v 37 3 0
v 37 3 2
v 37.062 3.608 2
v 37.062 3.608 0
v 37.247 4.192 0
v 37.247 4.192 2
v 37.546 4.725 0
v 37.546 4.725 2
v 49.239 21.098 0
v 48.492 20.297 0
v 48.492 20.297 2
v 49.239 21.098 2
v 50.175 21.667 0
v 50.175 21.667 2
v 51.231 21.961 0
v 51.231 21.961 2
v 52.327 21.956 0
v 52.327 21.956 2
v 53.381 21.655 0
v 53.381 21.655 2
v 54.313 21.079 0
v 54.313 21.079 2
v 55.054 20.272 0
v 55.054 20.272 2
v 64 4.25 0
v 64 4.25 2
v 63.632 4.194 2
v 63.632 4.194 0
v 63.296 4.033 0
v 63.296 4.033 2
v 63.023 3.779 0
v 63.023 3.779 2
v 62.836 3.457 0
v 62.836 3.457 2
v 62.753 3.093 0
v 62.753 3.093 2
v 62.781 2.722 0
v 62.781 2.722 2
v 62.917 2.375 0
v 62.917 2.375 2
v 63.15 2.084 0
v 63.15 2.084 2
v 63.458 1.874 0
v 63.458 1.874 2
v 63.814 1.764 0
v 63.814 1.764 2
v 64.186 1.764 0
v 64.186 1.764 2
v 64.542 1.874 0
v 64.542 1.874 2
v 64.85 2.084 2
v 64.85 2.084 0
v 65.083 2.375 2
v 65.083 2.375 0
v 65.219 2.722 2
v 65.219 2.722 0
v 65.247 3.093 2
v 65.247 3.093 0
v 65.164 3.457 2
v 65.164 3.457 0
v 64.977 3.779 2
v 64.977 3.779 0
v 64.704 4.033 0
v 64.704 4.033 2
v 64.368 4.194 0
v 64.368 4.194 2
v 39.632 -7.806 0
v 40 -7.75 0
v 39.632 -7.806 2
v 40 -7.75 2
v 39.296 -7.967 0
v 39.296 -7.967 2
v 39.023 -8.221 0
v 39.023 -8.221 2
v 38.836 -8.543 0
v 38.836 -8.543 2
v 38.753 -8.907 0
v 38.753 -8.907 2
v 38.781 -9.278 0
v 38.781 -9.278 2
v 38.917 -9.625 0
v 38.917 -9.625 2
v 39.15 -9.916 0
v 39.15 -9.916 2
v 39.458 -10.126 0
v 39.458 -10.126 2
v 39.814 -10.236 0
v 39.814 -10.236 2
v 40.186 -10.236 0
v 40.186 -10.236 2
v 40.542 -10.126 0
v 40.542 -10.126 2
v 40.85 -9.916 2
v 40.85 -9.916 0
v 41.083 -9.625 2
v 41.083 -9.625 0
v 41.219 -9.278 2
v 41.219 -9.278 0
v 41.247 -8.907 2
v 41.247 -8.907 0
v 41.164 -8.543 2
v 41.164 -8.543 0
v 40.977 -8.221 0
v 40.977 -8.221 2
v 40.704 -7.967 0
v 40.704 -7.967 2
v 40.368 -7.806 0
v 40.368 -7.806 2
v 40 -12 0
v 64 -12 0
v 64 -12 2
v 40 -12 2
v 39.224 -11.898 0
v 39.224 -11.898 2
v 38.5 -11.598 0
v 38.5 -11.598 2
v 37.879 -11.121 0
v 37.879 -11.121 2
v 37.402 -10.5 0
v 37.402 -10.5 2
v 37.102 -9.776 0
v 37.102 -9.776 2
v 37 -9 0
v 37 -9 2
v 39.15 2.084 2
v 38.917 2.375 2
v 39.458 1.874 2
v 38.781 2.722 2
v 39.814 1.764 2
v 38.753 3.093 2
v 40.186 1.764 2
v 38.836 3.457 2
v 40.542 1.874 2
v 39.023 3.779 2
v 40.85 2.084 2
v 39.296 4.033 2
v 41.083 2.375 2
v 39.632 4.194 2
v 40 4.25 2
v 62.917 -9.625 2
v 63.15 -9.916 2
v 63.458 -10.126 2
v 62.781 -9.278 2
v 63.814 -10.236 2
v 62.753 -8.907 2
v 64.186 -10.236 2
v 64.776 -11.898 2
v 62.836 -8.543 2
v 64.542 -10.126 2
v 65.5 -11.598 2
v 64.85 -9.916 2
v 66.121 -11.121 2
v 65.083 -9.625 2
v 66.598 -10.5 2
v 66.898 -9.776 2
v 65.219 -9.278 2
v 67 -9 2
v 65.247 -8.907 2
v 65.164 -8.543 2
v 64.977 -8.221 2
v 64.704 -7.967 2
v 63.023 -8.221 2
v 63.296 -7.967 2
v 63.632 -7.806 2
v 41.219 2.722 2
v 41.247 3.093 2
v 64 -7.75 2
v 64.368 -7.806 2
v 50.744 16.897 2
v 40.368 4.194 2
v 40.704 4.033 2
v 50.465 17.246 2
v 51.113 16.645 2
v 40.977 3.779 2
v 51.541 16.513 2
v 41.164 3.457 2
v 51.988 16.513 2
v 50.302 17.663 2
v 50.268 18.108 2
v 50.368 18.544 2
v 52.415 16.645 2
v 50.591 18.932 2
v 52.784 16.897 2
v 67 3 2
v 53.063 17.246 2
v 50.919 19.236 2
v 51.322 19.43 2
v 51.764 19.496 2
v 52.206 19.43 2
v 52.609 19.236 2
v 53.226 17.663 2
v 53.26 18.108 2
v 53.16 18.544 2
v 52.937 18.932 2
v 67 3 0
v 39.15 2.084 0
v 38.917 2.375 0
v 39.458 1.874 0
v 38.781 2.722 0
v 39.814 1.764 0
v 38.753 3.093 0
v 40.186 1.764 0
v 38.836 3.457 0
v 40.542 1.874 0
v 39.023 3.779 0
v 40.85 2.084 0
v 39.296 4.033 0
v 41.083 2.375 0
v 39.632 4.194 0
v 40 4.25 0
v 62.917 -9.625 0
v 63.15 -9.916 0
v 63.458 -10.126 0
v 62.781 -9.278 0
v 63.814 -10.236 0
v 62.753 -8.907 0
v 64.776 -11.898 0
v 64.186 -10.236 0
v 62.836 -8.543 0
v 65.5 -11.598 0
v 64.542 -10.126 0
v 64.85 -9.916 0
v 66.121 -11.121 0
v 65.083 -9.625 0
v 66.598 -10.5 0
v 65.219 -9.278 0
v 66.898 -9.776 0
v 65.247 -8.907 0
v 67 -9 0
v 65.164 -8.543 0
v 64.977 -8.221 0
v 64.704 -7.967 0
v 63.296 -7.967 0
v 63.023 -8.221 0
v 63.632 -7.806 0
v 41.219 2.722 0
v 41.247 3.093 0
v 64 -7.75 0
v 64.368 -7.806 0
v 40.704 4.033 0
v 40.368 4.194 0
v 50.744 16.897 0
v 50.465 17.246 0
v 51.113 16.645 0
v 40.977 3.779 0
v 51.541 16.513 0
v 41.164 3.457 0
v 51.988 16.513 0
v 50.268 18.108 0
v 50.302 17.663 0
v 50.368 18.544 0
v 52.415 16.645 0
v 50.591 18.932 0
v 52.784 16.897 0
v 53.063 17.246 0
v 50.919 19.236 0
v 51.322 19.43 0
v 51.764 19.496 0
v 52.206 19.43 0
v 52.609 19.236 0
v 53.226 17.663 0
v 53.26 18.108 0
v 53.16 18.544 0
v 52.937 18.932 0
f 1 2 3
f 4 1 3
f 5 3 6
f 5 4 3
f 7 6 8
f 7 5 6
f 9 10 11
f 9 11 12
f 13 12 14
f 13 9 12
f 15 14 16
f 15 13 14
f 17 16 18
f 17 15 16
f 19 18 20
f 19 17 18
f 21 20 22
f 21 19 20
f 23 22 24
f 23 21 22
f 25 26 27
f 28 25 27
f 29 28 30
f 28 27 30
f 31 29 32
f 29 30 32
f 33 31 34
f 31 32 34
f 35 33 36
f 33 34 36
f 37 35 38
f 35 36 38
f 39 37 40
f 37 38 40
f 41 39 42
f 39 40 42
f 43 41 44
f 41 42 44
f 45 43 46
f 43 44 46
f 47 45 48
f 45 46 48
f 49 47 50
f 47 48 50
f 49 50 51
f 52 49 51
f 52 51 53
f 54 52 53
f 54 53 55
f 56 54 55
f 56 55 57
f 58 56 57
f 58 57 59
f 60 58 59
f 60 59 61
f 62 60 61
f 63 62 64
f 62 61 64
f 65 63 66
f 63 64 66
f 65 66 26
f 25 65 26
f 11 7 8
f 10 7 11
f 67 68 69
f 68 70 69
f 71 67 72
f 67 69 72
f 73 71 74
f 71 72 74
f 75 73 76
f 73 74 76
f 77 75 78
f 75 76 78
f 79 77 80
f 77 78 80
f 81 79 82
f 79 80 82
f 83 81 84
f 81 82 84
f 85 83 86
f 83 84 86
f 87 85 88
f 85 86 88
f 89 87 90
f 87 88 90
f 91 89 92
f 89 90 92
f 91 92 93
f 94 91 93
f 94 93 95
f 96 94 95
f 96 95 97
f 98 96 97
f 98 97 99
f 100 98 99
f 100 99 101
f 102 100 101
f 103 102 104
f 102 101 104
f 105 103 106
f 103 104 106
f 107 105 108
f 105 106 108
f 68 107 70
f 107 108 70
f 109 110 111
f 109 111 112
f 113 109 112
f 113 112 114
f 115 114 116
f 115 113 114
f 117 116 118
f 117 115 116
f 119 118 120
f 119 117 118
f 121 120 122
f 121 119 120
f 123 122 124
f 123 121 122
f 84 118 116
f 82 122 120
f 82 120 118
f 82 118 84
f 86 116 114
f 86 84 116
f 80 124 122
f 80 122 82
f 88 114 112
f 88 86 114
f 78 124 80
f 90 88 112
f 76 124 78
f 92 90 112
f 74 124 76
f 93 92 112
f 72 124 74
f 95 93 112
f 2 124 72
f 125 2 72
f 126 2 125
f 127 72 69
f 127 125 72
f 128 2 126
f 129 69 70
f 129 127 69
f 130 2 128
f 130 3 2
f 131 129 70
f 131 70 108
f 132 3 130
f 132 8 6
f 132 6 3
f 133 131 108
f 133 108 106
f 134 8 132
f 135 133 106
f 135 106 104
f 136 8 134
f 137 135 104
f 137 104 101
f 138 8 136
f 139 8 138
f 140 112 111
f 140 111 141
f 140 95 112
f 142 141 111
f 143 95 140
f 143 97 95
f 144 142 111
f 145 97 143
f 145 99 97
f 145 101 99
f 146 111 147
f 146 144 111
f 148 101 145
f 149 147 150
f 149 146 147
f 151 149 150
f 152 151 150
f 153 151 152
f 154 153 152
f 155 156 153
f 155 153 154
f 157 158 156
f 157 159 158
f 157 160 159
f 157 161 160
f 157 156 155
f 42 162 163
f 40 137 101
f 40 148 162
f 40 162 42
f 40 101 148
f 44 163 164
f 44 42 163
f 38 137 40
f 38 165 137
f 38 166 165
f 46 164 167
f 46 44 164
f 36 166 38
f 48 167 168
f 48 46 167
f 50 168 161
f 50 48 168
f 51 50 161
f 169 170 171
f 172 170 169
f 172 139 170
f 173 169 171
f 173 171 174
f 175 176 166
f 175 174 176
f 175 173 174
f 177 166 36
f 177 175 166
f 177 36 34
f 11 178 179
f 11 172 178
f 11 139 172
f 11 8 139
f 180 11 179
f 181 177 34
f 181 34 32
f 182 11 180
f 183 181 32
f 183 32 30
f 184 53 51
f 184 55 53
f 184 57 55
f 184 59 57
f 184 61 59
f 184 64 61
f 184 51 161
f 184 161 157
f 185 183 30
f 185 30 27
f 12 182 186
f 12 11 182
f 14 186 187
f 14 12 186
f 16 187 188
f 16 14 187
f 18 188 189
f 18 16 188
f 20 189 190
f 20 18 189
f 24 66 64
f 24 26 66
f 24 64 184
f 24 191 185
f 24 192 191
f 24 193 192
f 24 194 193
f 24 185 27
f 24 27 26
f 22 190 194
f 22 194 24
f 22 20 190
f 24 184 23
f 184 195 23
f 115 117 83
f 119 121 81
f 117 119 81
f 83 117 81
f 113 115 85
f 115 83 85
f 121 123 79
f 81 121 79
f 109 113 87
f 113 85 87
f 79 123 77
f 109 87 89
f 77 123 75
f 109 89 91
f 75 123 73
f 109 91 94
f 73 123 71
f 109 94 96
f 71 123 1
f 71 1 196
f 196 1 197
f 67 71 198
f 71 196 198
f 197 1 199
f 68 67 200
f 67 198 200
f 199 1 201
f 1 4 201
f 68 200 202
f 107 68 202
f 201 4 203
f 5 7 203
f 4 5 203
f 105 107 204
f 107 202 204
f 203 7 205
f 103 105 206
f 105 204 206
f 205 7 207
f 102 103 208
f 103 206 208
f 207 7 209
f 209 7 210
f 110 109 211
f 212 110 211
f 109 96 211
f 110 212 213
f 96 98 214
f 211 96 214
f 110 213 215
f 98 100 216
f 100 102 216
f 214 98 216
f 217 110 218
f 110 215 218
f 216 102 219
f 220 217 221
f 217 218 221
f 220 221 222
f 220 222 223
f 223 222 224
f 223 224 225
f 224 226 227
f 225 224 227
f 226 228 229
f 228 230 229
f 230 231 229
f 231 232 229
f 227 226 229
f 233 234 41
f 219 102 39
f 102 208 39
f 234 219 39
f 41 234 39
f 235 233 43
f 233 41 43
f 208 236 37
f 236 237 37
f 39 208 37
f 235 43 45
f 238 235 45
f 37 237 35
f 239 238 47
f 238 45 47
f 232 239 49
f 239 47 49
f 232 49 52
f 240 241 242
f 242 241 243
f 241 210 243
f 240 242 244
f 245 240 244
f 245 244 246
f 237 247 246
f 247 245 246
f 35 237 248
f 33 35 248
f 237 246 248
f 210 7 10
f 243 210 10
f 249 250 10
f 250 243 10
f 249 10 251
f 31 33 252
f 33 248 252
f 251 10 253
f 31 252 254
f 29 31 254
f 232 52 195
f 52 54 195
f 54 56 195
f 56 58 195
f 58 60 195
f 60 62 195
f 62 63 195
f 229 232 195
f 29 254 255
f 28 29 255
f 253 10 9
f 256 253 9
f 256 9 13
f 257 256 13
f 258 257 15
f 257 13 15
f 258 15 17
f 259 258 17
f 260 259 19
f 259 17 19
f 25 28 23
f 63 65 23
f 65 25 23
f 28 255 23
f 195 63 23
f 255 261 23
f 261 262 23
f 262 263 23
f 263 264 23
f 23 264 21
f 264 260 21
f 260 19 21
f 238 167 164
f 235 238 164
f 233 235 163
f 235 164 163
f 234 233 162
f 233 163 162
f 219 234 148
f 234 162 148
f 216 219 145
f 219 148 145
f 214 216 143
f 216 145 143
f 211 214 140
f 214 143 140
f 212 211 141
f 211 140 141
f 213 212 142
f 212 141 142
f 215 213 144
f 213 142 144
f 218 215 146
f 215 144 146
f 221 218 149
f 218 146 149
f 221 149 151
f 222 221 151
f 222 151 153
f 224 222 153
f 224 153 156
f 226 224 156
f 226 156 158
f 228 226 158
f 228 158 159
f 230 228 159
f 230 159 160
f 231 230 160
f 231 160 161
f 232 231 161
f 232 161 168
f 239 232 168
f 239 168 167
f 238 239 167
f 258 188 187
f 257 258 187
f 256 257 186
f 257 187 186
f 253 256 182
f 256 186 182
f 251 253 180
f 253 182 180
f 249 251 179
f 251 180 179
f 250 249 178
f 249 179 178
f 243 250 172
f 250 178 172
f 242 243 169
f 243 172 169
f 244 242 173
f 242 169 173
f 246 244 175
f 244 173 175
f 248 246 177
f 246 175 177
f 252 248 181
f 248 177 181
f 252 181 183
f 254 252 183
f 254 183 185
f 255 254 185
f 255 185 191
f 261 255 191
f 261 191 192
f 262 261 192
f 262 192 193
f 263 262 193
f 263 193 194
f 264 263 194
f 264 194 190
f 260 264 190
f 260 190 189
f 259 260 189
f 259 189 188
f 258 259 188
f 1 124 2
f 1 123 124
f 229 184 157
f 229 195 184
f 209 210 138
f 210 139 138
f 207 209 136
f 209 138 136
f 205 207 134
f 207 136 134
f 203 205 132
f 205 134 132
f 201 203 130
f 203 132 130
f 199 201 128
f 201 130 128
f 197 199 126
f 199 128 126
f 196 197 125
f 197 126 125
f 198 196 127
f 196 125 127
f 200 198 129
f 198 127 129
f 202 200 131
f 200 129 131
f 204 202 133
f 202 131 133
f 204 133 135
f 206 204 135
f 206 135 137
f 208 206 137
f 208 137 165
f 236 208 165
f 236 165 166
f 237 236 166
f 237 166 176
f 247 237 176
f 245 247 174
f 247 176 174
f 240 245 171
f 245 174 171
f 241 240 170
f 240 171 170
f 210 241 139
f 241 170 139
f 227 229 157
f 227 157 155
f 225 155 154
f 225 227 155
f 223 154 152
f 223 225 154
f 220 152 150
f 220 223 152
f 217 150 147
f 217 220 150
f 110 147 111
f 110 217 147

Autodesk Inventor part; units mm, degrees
ref_plane "YZ Plane" through (0, 0, 0) normal (1, 0, 0) x (0, 1, 0)
ref_plane "XZ Plane" through (0, 0, 0) normal (0, 1, 0) x (-1, 0, 0)
ref_plane "XY Plane" through (0, 0, 0) normal (0, 0, 1) x (1, 0, 0)
sketch "スケッチ1" plane through (0, 0, 0) normal (0, 0, 1) x (1, 0, 0)
  line L0 (51.397, 0) -> (6, 70) construction
  line L1 (51.397, 0) -> (65, -20.9752)
  line L2 (65, -20.9752) -> (25, -44.6993)
  line L3 (0, 0) -> (0, 56.1205) construction
  line L4 (0, 0) -> (51.397, 0) construction
  arc A0 (17.9848, 26.067) -> (17.1698, 21.0636) centre (51.7641, 17.9963) ccw construction
  arc A1 (10.2038, 27.926) -> (9.201, 21.7701) centre (51.7641, 17.9963) ccw construction
  arc A2 (9.201, 21.7701) -> (17.1698, 21.0636) centre (13.1854, 21.4169) ccw construction
  line L5 (13.1854, 21.4169) -> (51.7641, 17.9963) construction
  line L6 (51.7641, 17.9963) -> (13.5604, 24.3596)
  arc A3 (13.5604, 24.3596) -> (13.1854, 21.4169) centre (51.7641, 17.9963) ccw construction
  line L7 (13.1854, 21.4169) -> (66.7927, -23.5971) construction
  line L8 (66.7927, -23.5971) -> (61.9625, 22.6577) construction
  line L9 (13.5604, 24.3596) -> (25, -44.6993)
  line L10 (13.5604, 24.3596) -> (6, 70) construction
  line L11 (13.5604, 24.3596) -> (51.397, 0) construction
  arc A4 (51.397, -25) -> (61.9625, 22.6577) centre (51.397, 0) ccw
  line L12 (25, -44.6993) -> (65, -44.6993) construction
  line L13 (65, -44.6993) -> (65, -20.9752) construction
  line L14 (45, -44.6993) -> (45, -284.6993) construction
  line L15 (51.397, 0) -> (51.9579, -2.4363)
  line L16 (51.397, 0) -> (50.5419, -2.3492) construction
  arc A5 (50.5419, -2.3492) -> (53.1648, 1.7678) centre (51.397, 0) ccw construction
  line L17 (51.397, 0) -> (51.3697, -2.4999) construction
  line L18 (51.397, 0) -> (52.2006, -2.3673) construction
  line L19 (51.397, 0) -> (52.9404, -1.9667) construction
  line L20 (51.397, 0) -> (53.5055, -1.3432) construction
  line L21 (51.397, 0) -> (53.8317, -0.5677) construction
  line L22 (51.397, 0) -> (53.8821, 0.2722) construction
  line L23 (51.397, 0) -> (53.6511, 1.0812) construction
  line L24 (51.397, 0) -> (53.1648, 1.7678) construction
  line L25 (51.7641, 17.9963) -> (51.9579, -2.4363)
  line L26 (50.5419, -2.3492) -> (51.7641, 17.9963) construction
  line L27 (51.7641, 17.9963) -> (53.1648, 1.7678) construction
  line L28 (51.397, -8) -> (51.397, -25) construction
  line L29 (54.051, -7.5469) -> (59.6907, -23.5842) construction
  line L30 (56.4044, -6.2391) -> (67.0451, -19.4971) construction
  line L31 (58.1906, -4.2245) -> (72.6271, -13.2017) construction
  line L32 (59.2074, -1.7315) -> (75.8044, -5.411) construction
  line L33 (59.3395, 0.9576) -> (76.2172, 2.9926) construction
  line L34 (58.572, 3.5383) -> (73.8188, 11.0572) construction
  line L35 (56.9918, 5.7182) -> (68.8808, 17.8694) construction
  line L36 (54.7779, 7.2505) -> (61.9625, 22.6577) construction
  arc A6 (51.397, -8) -> (54.7779, 7.2505) centre (51.397, 0) ccw construction
  line L37 (14.0943, 26.9965) -> (51.7641, 17.9963) construction
  arc A7 (14.0943, 26.9965) -> (13.5604, 24.3596) centre (51.7641, 17.9963) ccw construction
  arc A8 (17.9848, 26.067) -> (10.2038, 27.926) centre (14.0943, 26.9965) ccw construction
  line L38 (51.3697, -2.4999) -> (51.7641, 17.9963) construction
  line L39 (51.7641, 17.9963) -> (13.7589, 25.4541) construction
  line L40 (13.4871, 23.9026) -> (51.7641, 17.9963) construction
  line L41 (52.2006, -2.3673) -> (51.7641, 17.9963) construction
  line L42 (14.0943, 26.9965) -> (8.4208, -42.7732) construction
  line L43 (8.4208, -42.7732) -> (51.397, -25) construction
  line L44 (13.7589, 25.4541) -> (18.1084, -44.4107) construction
  line L45 (18.1084, -44.4107) -> (59.6907, -23.5842) construction
  line L46 (25, -44.6993) -> (45, -284.6993)
  line L47 (65, -20.9752) -> (45, -284.6993)
  line L48 (18.1084, -44.4107) -> (21.0305, -285.2248) construction
  line L49 (21.0305, -285.2248) -> (59.6907, -23.5842) construction
  line L50 (51.397, -25) -> (-6.0328, -283.171) construction
  line L51 (-6.0328, -283.171) -> (8.4208, -42.7732) construction
  line L52 (51.7641, 17.9963) -> (13.2929, 22.4663) construction
  line L53 (51.7641, 17.9963) -> (13.173, 21.2739) construction
  line L54 (51.7641, 17.9963) -> (13.1124, 20.4583) construction
  line L55 (51.7641, 17.9963) -> (13.0939, 20.1483) construction
  line L56 (51.7641, 17.9963) -> (13.1119, 20.4513) construction
  line L57 (51.7641, 17.9963) -> (52.9404, -1.9667) construction
  line L58 (51.7641, 17.9963) -> (53.5055, -1.3432) construction
  line L59 (51.7641, 17.9963) -> (53.8317, -0.5677) construction
  line L60 (51.7641, 17.9963) -> (53.8821, 0.2722) construction
  line L61 (51.7641, 17.9963) -> (53.6511, 1.0812) construction
  line L62 (13.4871, 23.9026) -> (27.8947, -44.5986) construction
  line L63 (27.8947, -44.5986) -> (67.0451, -19.4971) construction
  line L64 (72.6271, -13.2017) -> (37.1961, -43.3261) construction
  line L65 (37.1961, -43.3261) -> (13.2929, 22.4663) construction
  line L66 (13.173, 21.2739) -> (45.5916, -40.7666) construction
  line L67 (45.5916, -40.7666) -> (75.8044, -5.411) construction
  line L68 (76.2172, 2.9926) -> (52.8124, -37.1951) construction
  line L69 (52.8124, -37.1951) -> (13.1124, 20.4583) construction
  line L70 (13.0939, 20.1483) -> (58.7276, -32.9324) construction
  line L71 (58.7276, -32.9324) -> (73.8188, 11.0572) construction
  line L72 (68.8808, 17.8694) -> (63.3391, -28.3055) construction
  line L73 (63.3391, -28.3055) -> (13.1119, 20.4513) construction
  line L74 (27.8947, -44.5986) -> (56.2327, -283.7575) construction
  line L75 (61.9625, 22.6577) -> (293.1766, -105.7574) construction
  line L76 (293.1766, -105.7574) -> (66.7927, -23.5971) construction
  line L77 (68.8808, 17.8694) -> (265.8829, -158.5975) construction
  line L78 (265.8829, -158.5975) -> (63.3391, -28.3055) construction
  line L79 (58.7276, -32.9324) -> (229.4847, -202.7618) construction
  line L80 (229.4847, -202.7618) -> (73.8188, 11.0572) construction
  line L81 (76.2172, 2.9926) -> (187.0489, -237.1465) construction
  line L82 (187.0489, -237.1465) -> (52.8124, -37.1951) construction
  line L83 (45.5916, -40.7666) -> (141.9163, -261.4962) construction
  line L84 (141.9163, -261.4962) -> (75.8044, -5.411) construction
  line L85 (72.6271, -13.2017) -> (97.3466, -276.5254) construction
  line L86 (97.3466, -276.5254) -> (37.1961, -43.3261) construction
  line L87 (56.2327, -283.7575) -> (67.0451, -19.4971) construction
  spline S0 degree 4 poles (-6.0328, -283.171) (-1.0018, -286.6814) (51.7016, -283.757) (37.9506, -286.9352) (110.0397, -275.596) (142.8766, -261.8211) (210.6869, -227.817) (251.1, -183.7947) (281.212, -139.9837) (293.1766, -105.7574) knots 0 0 0 0 0 0.215081 0.31035 0.415619 0.538699 0.666654 1 1 1 1 1 construction
  spline S1 degree 4 poles (8.4208, -42.7732) (14.2837, -44.205) (22.8164, -45.2788) (33.6178, -44.6875) (45.3572, -41.166) (55.0356, -36.4401) (61.2363, -31.2275) (64.7888, -26.7723) (66.7927, -23.5971) knots 0 0 0 0 0 0.340062 0.471566 0.598373 0.71961 1 1 1 1 1
  point P0 (51.397, 0)
  point P1 (51.397, 0)
  point P2 (51.397, 0)
  point P3 (51.397, 0)
  point P4 (51.397, 0)
  point P5 (51.397, 0)
  point P6 (51.397, 0)
  point P7 (51.397, 0)
  dimension "d5" = 70
  dimension "d53" = 45
  dimension "d66" = 25
  dimension "d67" = 40
  dimension "d72" = 240
  dimension "d74" = 20
  dimension "d76" = 2.5
  dimension "d80" = 155
  dimension "d82" = 18
  dimension "d85" = 155
  dimension "d87" = 20
  dimension "d88" = 70
  dimension "d89" = 100
  dimension "d90" = 100
  dimension "d91" = 100
  dimension "d92" = 4
  dimension "d93" = 100
  dimension "d94" = 100
  dimension "d95" = 90
  dimension "d96" = 100
  dimension "d97" = 100
  dimension "d98" = 100
  dimension "d99" = 100
  dimension "d100" = 100
  dimension "d101" = 8
  dimension "d102" = 6
  dimension "d103" = 45
sketch "スケッチ2" plane through (0, 0, 0) normal (0, 0, 1) x (1, 0, 0)
  arc A0 (55.0538, 20.2717) -> (48.4917, 20.2966) centre (51.7641, 17.9963) ccw
  line L0 (40, 3) -> (64, 3) construction
  line L1 (64, 3) -> (64, -9) construction
  line L2 (64, -9) -> (40, -9) construction
  line L3 (40, -9) -> (40, 3) construction
  line L4 (36, 10.1673) -> (36, -48.9437) construction
  line L5 (67, 3) -> (67, -9)
  line L6 (64, -12) -> (40, -12)
  line L7 (37, -9) -> (37, 3)
  arc A1 (37, -9) -> (40, -12) centre (40, -9) ccw
  arc A2 (37.5457, 4.7253) -> (37, 3) centre (40, 3) ccw
  arc A3 (64, -12) -> (67, -9) centre (64, -9) ccw
  line L8 (0, 0) -> (0, -59.5537) construction
  line L9 (10.6628, -3) -> (66.9205, -3) construction
  line L10 (67, 3) -> (55.0538, 20.2717)
  line L11 (37.5457, 4.7253) -> (48.4917, 20.2966)
  dimension "d16" = 24
  dimension "d17" = 4
  dimension "d18" = 12
  dimension "d19" = 3
  dimension "d20" = 72
  dimension "d21" = 3
  dimension "d23" = 4
extrude "押し出し1" add sketch "スケッチ2" along normal blind 2
hole "穴1" at (51.7641, 17.9963, 0) direction (0, 0, 1) diameter 3 end through all
hole "穴2" at (64, 3, 0) at (40, 3, 0) at (40, -9, 0) at (64, -9, 0) direction (0, 0, 1) diameter 2.5 end through all
equation "\"input_link_length\" = 25"
equation "\"input_link_formed_angle\" = 20deg"
equation "\"support_formed_angle\" = 100deg"
equation "\"input_slider_radius\" = 2.5"
equation "\"driver_rotation_range\" = 155deg"
equation "\"virtual_link_length\" = 45"
equation "\"virtual_mass_point_x\" = 6"
equation "\"support_axis_driver_dist\" = 18"
properties part number "COXA_YAW_SERVO_BASE"
